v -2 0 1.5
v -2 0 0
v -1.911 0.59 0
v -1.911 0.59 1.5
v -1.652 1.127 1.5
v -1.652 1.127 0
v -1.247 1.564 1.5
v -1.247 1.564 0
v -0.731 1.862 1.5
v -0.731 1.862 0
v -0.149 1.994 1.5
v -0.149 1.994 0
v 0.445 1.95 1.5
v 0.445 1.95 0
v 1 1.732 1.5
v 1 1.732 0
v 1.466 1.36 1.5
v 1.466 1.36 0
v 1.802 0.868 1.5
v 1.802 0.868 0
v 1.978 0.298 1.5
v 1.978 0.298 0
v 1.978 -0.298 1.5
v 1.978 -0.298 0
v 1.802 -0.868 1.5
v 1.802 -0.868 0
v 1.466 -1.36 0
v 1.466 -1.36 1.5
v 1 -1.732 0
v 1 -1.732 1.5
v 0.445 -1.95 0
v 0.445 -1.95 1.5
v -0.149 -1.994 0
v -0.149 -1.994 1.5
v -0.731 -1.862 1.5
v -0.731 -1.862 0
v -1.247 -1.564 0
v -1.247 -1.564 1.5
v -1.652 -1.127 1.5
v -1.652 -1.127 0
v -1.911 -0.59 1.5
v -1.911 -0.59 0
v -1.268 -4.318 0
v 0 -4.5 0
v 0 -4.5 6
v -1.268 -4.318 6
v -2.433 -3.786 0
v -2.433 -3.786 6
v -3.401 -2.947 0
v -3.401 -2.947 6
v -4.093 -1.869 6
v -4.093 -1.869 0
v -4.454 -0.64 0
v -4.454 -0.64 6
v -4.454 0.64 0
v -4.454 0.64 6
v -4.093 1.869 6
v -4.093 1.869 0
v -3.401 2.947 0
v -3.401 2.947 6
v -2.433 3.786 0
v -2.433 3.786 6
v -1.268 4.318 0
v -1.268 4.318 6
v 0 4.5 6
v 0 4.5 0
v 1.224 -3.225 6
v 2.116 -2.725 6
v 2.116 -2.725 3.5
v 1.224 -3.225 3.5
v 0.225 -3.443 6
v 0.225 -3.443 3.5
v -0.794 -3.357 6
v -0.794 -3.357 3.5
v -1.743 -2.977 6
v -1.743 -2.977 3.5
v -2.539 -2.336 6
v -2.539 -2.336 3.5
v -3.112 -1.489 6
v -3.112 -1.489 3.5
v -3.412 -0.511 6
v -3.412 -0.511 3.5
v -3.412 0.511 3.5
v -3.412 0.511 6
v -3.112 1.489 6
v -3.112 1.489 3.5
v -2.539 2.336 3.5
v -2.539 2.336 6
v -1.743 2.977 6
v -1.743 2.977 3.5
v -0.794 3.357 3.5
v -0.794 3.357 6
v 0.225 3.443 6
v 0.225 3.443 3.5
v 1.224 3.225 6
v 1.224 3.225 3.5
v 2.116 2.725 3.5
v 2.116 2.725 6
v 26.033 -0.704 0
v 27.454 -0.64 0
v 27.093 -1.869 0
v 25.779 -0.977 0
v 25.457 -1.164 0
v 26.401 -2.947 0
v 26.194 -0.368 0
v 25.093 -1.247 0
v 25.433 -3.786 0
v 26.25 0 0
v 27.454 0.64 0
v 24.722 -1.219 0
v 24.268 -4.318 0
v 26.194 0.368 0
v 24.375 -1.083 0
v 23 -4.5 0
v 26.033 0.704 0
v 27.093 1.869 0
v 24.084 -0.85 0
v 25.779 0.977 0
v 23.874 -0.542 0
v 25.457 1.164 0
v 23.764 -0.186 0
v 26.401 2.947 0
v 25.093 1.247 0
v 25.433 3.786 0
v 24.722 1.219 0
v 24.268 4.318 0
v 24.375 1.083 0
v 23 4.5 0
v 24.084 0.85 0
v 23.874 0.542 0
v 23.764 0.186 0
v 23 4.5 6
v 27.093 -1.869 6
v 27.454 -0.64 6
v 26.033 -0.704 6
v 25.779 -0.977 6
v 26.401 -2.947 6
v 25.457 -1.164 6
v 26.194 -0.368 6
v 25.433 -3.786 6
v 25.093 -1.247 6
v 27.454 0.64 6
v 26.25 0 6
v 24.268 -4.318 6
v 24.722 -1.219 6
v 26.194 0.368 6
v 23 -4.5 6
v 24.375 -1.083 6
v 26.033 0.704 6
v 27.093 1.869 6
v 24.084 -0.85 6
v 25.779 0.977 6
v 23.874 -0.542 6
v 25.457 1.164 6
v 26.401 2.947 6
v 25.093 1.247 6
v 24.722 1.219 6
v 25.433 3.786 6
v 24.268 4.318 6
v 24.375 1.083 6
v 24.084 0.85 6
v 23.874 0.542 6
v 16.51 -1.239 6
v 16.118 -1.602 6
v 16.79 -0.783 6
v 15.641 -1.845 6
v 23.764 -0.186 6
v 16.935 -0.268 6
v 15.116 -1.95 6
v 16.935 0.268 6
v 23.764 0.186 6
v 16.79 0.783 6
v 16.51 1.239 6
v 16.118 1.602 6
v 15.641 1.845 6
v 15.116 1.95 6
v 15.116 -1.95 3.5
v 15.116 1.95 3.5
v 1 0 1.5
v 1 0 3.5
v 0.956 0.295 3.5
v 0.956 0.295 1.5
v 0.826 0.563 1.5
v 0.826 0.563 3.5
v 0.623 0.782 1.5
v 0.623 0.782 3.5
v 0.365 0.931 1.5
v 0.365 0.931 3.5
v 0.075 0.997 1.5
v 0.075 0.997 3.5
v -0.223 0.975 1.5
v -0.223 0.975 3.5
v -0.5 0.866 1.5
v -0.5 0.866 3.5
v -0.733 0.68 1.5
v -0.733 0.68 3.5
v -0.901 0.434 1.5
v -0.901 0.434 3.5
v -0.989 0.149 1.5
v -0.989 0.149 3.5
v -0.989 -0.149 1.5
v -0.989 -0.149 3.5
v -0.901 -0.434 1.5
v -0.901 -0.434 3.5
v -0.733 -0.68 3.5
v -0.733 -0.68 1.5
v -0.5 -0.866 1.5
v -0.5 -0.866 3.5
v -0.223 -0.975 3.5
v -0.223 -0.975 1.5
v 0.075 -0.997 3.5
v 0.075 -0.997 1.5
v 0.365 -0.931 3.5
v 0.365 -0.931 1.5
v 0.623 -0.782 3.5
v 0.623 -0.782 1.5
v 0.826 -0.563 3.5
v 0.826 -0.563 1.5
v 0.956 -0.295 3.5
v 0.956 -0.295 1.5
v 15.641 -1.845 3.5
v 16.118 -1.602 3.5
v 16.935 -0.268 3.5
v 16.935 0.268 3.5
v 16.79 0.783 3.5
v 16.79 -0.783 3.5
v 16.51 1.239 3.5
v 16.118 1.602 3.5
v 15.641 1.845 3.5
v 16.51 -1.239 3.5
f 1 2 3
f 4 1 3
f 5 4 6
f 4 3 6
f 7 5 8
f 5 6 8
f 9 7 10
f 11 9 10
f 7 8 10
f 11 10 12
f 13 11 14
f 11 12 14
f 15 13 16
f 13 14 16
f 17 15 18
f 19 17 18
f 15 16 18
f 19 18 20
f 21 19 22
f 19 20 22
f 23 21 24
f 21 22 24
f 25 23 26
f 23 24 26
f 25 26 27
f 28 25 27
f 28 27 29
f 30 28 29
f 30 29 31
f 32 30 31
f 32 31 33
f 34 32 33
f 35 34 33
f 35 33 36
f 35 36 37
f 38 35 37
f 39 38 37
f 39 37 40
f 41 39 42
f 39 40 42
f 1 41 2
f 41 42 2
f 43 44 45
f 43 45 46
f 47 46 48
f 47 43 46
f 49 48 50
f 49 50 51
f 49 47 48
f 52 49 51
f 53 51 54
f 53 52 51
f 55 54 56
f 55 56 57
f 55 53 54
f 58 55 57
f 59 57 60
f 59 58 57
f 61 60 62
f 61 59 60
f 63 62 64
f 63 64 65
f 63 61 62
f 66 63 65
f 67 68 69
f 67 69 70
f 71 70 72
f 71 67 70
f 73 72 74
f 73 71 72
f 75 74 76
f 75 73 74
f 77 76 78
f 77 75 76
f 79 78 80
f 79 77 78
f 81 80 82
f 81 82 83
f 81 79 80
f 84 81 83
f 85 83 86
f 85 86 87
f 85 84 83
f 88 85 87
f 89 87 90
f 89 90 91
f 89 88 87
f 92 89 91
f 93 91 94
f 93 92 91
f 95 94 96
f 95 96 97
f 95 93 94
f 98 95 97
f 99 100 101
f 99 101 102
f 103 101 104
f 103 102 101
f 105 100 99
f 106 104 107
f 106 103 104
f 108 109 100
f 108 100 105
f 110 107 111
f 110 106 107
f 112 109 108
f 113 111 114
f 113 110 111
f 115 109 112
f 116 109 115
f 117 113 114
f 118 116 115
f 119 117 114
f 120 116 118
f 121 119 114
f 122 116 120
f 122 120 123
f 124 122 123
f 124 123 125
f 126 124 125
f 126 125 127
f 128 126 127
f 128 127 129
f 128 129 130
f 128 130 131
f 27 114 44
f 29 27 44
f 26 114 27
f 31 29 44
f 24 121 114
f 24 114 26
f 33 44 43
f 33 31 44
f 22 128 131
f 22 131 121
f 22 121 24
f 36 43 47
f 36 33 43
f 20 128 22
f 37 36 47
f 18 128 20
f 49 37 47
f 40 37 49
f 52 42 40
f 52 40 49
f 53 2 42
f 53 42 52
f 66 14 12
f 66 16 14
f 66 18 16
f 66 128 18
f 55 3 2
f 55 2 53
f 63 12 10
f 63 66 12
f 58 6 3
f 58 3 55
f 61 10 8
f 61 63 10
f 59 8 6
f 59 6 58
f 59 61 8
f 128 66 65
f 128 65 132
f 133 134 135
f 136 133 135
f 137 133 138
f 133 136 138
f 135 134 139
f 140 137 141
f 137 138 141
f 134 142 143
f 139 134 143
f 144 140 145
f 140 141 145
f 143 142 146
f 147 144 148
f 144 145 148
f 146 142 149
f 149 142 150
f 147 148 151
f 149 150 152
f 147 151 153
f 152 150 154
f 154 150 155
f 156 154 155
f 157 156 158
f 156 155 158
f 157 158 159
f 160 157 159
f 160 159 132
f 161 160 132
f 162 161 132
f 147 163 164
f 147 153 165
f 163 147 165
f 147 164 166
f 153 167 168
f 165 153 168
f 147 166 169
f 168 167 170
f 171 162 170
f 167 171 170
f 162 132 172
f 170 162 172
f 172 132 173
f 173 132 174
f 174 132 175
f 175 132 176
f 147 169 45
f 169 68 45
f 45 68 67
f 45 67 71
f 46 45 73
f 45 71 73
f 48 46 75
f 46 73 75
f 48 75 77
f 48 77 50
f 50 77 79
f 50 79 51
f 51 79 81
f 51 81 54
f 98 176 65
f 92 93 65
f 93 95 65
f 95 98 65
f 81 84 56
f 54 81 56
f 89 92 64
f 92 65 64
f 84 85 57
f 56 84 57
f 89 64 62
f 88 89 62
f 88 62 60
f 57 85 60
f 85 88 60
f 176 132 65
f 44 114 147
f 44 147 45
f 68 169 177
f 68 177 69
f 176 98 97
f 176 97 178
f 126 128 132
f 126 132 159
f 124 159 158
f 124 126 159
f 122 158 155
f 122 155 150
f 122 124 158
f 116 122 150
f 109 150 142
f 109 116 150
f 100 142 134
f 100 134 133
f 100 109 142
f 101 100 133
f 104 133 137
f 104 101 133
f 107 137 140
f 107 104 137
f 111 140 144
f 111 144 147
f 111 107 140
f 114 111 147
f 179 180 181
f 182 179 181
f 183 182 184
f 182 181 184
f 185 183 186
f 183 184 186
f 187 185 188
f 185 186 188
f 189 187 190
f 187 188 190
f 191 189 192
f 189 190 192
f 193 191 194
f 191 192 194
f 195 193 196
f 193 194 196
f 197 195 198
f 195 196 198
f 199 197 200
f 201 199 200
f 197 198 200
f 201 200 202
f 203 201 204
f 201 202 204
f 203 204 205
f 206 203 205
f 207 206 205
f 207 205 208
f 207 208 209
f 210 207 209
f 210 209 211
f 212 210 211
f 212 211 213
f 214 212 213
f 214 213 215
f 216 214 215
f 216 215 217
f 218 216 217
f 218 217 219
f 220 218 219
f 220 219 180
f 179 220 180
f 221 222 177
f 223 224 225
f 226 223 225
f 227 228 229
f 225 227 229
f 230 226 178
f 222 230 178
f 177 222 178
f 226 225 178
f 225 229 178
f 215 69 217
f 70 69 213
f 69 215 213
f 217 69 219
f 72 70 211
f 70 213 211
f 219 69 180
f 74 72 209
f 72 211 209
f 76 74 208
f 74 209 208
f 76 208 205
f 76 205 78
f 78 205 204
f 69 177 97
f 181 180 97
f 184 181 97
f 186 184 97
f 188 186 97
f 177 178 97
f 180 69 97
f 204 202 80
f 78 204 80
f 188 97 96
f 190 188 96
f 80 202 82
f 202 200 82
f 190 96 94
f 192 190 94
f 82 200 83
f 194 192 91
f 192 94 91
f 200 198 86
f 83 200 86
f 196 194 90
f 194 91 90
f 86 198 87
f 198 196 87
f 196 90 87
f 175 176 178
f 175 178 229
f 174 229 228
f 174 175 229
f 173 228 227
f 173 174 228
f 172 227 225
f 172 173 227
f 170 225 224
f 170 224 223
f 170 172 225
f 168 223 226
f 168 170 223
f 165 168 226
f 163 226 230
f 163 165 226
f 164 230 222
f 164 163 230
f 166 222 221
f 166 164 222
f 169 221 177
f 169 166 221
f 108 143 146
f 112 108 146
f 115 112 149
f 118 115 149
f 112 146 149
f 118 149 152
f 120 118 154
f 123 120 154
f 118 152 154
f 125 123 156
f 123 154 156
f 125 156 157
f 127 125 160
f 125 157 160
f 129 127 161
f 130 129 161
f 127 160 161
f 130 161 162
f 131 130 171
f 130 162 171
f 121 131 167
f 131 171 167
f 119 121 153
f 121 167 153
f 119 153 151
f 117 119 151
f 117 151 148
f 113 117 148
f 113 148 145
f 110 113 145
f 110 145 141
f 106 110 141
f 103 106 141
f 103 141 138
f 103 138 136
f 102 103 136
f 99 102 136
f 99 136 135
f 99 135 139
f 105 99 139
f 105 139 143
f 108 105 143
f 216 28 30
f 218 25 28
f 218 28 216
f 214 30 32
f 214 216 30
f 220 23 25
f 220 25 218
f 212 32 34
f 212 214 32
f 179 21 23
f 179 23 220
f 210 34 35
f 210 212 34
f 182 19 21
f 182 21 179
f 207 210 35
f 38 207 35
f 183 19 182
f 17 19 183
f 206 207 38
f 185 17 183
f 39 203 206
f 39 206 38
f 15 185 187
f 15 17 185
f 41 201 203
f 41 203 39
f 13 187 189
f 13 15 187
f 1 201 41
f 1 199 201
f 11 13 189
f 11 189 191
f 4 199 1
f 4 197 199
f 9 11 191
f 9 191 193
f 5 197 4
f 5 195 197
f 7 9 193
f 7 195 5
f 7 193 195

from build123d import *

# Parameters (mm, degrees)
BOSS_EXTRUDE1_DEPTH = 6
CUT_EXTRUDE1_DEPTH  = 2.5
SKETCH3_R           = 1
CUT_EXTRUDE2_DEPTH  = 7
SKETCH4_R           = 2
CUT_EXTRUDE3_DEPTH  = 1.5
SKETCH5_R           = 1.25
CUT_EXTRUDE4_DEPTH  = 7


with BuildPart() as part:
    # Sketch1 → Boss-Extrude1 (new body)
    with BuildSketch(Plane.XY):
        with BuildLine():
            Line((0, 4.5), (23, 4.5))
            ThreePointArc((23, 4.5), (27.5, 0), (23, -4.5))
            Line((23, -4.5), (0, -4.5))
            ThreePointArc((0, -4.5), (-4.5, 0), (0, 4.5))
        make_face()
    extrude(amount=BOSS_EXTRUDE1_DEPTH)

    # Sketch2 → Cut-Extrude1 (cut)
    with BuildSketch(Plane.XY.offset(6)):
        with BuildLine():
            Line((2.115862708, 2.725), (15.116246568, 1.95))
            ThreePointArc((15.116246568, 1.95), (16.953461867, 0), (15.116246568, -1.95))
            Line((15.116246568, -1.95), (2.115862708, -2.725))
            ThreePointArc((2.115862708, -2.725), (-3.45, 0), (2.115862708, 2.725))
        make_face()
    extrude(amount=-CUT_EXTRUDE1_DEPTH, mode=Mode.SUBTRACT)

    # Sketch3 → Cut-Extrude2 (cut, through all)
    with BuildSketch(Plane.XY.offset(6)):
        Circle(SKETCH3_R)
    extrude(amount=-CUT_EXTRUDE2_DEPTH, mode=Mode.SUBTRACT)

    # Sketch4 → Cut-Extrude3 (cut)
    with BuildSketch(Plane(origin=(0, 0, 0), x_dir=(-1, 0, 0), z_dir=(0, 0, -1))):
        Circle(SKETCH4_R)
    extrude(amount=-CUT_EXTRUDE3_DEPTH, mode=Mode.SUBTRACT)

    # Sketch5 → Cut-Extrude4 (cut, through all)
    with BuildSketch(Plane.XY.offset(6)):
        with Locations((25, 0)):
            Circle(SKETCH5_R)
    extrude(amount=-CUT_EXTRUDE4_DEPTH, mode=Mode.SUBTRACT)


solid = part.part
